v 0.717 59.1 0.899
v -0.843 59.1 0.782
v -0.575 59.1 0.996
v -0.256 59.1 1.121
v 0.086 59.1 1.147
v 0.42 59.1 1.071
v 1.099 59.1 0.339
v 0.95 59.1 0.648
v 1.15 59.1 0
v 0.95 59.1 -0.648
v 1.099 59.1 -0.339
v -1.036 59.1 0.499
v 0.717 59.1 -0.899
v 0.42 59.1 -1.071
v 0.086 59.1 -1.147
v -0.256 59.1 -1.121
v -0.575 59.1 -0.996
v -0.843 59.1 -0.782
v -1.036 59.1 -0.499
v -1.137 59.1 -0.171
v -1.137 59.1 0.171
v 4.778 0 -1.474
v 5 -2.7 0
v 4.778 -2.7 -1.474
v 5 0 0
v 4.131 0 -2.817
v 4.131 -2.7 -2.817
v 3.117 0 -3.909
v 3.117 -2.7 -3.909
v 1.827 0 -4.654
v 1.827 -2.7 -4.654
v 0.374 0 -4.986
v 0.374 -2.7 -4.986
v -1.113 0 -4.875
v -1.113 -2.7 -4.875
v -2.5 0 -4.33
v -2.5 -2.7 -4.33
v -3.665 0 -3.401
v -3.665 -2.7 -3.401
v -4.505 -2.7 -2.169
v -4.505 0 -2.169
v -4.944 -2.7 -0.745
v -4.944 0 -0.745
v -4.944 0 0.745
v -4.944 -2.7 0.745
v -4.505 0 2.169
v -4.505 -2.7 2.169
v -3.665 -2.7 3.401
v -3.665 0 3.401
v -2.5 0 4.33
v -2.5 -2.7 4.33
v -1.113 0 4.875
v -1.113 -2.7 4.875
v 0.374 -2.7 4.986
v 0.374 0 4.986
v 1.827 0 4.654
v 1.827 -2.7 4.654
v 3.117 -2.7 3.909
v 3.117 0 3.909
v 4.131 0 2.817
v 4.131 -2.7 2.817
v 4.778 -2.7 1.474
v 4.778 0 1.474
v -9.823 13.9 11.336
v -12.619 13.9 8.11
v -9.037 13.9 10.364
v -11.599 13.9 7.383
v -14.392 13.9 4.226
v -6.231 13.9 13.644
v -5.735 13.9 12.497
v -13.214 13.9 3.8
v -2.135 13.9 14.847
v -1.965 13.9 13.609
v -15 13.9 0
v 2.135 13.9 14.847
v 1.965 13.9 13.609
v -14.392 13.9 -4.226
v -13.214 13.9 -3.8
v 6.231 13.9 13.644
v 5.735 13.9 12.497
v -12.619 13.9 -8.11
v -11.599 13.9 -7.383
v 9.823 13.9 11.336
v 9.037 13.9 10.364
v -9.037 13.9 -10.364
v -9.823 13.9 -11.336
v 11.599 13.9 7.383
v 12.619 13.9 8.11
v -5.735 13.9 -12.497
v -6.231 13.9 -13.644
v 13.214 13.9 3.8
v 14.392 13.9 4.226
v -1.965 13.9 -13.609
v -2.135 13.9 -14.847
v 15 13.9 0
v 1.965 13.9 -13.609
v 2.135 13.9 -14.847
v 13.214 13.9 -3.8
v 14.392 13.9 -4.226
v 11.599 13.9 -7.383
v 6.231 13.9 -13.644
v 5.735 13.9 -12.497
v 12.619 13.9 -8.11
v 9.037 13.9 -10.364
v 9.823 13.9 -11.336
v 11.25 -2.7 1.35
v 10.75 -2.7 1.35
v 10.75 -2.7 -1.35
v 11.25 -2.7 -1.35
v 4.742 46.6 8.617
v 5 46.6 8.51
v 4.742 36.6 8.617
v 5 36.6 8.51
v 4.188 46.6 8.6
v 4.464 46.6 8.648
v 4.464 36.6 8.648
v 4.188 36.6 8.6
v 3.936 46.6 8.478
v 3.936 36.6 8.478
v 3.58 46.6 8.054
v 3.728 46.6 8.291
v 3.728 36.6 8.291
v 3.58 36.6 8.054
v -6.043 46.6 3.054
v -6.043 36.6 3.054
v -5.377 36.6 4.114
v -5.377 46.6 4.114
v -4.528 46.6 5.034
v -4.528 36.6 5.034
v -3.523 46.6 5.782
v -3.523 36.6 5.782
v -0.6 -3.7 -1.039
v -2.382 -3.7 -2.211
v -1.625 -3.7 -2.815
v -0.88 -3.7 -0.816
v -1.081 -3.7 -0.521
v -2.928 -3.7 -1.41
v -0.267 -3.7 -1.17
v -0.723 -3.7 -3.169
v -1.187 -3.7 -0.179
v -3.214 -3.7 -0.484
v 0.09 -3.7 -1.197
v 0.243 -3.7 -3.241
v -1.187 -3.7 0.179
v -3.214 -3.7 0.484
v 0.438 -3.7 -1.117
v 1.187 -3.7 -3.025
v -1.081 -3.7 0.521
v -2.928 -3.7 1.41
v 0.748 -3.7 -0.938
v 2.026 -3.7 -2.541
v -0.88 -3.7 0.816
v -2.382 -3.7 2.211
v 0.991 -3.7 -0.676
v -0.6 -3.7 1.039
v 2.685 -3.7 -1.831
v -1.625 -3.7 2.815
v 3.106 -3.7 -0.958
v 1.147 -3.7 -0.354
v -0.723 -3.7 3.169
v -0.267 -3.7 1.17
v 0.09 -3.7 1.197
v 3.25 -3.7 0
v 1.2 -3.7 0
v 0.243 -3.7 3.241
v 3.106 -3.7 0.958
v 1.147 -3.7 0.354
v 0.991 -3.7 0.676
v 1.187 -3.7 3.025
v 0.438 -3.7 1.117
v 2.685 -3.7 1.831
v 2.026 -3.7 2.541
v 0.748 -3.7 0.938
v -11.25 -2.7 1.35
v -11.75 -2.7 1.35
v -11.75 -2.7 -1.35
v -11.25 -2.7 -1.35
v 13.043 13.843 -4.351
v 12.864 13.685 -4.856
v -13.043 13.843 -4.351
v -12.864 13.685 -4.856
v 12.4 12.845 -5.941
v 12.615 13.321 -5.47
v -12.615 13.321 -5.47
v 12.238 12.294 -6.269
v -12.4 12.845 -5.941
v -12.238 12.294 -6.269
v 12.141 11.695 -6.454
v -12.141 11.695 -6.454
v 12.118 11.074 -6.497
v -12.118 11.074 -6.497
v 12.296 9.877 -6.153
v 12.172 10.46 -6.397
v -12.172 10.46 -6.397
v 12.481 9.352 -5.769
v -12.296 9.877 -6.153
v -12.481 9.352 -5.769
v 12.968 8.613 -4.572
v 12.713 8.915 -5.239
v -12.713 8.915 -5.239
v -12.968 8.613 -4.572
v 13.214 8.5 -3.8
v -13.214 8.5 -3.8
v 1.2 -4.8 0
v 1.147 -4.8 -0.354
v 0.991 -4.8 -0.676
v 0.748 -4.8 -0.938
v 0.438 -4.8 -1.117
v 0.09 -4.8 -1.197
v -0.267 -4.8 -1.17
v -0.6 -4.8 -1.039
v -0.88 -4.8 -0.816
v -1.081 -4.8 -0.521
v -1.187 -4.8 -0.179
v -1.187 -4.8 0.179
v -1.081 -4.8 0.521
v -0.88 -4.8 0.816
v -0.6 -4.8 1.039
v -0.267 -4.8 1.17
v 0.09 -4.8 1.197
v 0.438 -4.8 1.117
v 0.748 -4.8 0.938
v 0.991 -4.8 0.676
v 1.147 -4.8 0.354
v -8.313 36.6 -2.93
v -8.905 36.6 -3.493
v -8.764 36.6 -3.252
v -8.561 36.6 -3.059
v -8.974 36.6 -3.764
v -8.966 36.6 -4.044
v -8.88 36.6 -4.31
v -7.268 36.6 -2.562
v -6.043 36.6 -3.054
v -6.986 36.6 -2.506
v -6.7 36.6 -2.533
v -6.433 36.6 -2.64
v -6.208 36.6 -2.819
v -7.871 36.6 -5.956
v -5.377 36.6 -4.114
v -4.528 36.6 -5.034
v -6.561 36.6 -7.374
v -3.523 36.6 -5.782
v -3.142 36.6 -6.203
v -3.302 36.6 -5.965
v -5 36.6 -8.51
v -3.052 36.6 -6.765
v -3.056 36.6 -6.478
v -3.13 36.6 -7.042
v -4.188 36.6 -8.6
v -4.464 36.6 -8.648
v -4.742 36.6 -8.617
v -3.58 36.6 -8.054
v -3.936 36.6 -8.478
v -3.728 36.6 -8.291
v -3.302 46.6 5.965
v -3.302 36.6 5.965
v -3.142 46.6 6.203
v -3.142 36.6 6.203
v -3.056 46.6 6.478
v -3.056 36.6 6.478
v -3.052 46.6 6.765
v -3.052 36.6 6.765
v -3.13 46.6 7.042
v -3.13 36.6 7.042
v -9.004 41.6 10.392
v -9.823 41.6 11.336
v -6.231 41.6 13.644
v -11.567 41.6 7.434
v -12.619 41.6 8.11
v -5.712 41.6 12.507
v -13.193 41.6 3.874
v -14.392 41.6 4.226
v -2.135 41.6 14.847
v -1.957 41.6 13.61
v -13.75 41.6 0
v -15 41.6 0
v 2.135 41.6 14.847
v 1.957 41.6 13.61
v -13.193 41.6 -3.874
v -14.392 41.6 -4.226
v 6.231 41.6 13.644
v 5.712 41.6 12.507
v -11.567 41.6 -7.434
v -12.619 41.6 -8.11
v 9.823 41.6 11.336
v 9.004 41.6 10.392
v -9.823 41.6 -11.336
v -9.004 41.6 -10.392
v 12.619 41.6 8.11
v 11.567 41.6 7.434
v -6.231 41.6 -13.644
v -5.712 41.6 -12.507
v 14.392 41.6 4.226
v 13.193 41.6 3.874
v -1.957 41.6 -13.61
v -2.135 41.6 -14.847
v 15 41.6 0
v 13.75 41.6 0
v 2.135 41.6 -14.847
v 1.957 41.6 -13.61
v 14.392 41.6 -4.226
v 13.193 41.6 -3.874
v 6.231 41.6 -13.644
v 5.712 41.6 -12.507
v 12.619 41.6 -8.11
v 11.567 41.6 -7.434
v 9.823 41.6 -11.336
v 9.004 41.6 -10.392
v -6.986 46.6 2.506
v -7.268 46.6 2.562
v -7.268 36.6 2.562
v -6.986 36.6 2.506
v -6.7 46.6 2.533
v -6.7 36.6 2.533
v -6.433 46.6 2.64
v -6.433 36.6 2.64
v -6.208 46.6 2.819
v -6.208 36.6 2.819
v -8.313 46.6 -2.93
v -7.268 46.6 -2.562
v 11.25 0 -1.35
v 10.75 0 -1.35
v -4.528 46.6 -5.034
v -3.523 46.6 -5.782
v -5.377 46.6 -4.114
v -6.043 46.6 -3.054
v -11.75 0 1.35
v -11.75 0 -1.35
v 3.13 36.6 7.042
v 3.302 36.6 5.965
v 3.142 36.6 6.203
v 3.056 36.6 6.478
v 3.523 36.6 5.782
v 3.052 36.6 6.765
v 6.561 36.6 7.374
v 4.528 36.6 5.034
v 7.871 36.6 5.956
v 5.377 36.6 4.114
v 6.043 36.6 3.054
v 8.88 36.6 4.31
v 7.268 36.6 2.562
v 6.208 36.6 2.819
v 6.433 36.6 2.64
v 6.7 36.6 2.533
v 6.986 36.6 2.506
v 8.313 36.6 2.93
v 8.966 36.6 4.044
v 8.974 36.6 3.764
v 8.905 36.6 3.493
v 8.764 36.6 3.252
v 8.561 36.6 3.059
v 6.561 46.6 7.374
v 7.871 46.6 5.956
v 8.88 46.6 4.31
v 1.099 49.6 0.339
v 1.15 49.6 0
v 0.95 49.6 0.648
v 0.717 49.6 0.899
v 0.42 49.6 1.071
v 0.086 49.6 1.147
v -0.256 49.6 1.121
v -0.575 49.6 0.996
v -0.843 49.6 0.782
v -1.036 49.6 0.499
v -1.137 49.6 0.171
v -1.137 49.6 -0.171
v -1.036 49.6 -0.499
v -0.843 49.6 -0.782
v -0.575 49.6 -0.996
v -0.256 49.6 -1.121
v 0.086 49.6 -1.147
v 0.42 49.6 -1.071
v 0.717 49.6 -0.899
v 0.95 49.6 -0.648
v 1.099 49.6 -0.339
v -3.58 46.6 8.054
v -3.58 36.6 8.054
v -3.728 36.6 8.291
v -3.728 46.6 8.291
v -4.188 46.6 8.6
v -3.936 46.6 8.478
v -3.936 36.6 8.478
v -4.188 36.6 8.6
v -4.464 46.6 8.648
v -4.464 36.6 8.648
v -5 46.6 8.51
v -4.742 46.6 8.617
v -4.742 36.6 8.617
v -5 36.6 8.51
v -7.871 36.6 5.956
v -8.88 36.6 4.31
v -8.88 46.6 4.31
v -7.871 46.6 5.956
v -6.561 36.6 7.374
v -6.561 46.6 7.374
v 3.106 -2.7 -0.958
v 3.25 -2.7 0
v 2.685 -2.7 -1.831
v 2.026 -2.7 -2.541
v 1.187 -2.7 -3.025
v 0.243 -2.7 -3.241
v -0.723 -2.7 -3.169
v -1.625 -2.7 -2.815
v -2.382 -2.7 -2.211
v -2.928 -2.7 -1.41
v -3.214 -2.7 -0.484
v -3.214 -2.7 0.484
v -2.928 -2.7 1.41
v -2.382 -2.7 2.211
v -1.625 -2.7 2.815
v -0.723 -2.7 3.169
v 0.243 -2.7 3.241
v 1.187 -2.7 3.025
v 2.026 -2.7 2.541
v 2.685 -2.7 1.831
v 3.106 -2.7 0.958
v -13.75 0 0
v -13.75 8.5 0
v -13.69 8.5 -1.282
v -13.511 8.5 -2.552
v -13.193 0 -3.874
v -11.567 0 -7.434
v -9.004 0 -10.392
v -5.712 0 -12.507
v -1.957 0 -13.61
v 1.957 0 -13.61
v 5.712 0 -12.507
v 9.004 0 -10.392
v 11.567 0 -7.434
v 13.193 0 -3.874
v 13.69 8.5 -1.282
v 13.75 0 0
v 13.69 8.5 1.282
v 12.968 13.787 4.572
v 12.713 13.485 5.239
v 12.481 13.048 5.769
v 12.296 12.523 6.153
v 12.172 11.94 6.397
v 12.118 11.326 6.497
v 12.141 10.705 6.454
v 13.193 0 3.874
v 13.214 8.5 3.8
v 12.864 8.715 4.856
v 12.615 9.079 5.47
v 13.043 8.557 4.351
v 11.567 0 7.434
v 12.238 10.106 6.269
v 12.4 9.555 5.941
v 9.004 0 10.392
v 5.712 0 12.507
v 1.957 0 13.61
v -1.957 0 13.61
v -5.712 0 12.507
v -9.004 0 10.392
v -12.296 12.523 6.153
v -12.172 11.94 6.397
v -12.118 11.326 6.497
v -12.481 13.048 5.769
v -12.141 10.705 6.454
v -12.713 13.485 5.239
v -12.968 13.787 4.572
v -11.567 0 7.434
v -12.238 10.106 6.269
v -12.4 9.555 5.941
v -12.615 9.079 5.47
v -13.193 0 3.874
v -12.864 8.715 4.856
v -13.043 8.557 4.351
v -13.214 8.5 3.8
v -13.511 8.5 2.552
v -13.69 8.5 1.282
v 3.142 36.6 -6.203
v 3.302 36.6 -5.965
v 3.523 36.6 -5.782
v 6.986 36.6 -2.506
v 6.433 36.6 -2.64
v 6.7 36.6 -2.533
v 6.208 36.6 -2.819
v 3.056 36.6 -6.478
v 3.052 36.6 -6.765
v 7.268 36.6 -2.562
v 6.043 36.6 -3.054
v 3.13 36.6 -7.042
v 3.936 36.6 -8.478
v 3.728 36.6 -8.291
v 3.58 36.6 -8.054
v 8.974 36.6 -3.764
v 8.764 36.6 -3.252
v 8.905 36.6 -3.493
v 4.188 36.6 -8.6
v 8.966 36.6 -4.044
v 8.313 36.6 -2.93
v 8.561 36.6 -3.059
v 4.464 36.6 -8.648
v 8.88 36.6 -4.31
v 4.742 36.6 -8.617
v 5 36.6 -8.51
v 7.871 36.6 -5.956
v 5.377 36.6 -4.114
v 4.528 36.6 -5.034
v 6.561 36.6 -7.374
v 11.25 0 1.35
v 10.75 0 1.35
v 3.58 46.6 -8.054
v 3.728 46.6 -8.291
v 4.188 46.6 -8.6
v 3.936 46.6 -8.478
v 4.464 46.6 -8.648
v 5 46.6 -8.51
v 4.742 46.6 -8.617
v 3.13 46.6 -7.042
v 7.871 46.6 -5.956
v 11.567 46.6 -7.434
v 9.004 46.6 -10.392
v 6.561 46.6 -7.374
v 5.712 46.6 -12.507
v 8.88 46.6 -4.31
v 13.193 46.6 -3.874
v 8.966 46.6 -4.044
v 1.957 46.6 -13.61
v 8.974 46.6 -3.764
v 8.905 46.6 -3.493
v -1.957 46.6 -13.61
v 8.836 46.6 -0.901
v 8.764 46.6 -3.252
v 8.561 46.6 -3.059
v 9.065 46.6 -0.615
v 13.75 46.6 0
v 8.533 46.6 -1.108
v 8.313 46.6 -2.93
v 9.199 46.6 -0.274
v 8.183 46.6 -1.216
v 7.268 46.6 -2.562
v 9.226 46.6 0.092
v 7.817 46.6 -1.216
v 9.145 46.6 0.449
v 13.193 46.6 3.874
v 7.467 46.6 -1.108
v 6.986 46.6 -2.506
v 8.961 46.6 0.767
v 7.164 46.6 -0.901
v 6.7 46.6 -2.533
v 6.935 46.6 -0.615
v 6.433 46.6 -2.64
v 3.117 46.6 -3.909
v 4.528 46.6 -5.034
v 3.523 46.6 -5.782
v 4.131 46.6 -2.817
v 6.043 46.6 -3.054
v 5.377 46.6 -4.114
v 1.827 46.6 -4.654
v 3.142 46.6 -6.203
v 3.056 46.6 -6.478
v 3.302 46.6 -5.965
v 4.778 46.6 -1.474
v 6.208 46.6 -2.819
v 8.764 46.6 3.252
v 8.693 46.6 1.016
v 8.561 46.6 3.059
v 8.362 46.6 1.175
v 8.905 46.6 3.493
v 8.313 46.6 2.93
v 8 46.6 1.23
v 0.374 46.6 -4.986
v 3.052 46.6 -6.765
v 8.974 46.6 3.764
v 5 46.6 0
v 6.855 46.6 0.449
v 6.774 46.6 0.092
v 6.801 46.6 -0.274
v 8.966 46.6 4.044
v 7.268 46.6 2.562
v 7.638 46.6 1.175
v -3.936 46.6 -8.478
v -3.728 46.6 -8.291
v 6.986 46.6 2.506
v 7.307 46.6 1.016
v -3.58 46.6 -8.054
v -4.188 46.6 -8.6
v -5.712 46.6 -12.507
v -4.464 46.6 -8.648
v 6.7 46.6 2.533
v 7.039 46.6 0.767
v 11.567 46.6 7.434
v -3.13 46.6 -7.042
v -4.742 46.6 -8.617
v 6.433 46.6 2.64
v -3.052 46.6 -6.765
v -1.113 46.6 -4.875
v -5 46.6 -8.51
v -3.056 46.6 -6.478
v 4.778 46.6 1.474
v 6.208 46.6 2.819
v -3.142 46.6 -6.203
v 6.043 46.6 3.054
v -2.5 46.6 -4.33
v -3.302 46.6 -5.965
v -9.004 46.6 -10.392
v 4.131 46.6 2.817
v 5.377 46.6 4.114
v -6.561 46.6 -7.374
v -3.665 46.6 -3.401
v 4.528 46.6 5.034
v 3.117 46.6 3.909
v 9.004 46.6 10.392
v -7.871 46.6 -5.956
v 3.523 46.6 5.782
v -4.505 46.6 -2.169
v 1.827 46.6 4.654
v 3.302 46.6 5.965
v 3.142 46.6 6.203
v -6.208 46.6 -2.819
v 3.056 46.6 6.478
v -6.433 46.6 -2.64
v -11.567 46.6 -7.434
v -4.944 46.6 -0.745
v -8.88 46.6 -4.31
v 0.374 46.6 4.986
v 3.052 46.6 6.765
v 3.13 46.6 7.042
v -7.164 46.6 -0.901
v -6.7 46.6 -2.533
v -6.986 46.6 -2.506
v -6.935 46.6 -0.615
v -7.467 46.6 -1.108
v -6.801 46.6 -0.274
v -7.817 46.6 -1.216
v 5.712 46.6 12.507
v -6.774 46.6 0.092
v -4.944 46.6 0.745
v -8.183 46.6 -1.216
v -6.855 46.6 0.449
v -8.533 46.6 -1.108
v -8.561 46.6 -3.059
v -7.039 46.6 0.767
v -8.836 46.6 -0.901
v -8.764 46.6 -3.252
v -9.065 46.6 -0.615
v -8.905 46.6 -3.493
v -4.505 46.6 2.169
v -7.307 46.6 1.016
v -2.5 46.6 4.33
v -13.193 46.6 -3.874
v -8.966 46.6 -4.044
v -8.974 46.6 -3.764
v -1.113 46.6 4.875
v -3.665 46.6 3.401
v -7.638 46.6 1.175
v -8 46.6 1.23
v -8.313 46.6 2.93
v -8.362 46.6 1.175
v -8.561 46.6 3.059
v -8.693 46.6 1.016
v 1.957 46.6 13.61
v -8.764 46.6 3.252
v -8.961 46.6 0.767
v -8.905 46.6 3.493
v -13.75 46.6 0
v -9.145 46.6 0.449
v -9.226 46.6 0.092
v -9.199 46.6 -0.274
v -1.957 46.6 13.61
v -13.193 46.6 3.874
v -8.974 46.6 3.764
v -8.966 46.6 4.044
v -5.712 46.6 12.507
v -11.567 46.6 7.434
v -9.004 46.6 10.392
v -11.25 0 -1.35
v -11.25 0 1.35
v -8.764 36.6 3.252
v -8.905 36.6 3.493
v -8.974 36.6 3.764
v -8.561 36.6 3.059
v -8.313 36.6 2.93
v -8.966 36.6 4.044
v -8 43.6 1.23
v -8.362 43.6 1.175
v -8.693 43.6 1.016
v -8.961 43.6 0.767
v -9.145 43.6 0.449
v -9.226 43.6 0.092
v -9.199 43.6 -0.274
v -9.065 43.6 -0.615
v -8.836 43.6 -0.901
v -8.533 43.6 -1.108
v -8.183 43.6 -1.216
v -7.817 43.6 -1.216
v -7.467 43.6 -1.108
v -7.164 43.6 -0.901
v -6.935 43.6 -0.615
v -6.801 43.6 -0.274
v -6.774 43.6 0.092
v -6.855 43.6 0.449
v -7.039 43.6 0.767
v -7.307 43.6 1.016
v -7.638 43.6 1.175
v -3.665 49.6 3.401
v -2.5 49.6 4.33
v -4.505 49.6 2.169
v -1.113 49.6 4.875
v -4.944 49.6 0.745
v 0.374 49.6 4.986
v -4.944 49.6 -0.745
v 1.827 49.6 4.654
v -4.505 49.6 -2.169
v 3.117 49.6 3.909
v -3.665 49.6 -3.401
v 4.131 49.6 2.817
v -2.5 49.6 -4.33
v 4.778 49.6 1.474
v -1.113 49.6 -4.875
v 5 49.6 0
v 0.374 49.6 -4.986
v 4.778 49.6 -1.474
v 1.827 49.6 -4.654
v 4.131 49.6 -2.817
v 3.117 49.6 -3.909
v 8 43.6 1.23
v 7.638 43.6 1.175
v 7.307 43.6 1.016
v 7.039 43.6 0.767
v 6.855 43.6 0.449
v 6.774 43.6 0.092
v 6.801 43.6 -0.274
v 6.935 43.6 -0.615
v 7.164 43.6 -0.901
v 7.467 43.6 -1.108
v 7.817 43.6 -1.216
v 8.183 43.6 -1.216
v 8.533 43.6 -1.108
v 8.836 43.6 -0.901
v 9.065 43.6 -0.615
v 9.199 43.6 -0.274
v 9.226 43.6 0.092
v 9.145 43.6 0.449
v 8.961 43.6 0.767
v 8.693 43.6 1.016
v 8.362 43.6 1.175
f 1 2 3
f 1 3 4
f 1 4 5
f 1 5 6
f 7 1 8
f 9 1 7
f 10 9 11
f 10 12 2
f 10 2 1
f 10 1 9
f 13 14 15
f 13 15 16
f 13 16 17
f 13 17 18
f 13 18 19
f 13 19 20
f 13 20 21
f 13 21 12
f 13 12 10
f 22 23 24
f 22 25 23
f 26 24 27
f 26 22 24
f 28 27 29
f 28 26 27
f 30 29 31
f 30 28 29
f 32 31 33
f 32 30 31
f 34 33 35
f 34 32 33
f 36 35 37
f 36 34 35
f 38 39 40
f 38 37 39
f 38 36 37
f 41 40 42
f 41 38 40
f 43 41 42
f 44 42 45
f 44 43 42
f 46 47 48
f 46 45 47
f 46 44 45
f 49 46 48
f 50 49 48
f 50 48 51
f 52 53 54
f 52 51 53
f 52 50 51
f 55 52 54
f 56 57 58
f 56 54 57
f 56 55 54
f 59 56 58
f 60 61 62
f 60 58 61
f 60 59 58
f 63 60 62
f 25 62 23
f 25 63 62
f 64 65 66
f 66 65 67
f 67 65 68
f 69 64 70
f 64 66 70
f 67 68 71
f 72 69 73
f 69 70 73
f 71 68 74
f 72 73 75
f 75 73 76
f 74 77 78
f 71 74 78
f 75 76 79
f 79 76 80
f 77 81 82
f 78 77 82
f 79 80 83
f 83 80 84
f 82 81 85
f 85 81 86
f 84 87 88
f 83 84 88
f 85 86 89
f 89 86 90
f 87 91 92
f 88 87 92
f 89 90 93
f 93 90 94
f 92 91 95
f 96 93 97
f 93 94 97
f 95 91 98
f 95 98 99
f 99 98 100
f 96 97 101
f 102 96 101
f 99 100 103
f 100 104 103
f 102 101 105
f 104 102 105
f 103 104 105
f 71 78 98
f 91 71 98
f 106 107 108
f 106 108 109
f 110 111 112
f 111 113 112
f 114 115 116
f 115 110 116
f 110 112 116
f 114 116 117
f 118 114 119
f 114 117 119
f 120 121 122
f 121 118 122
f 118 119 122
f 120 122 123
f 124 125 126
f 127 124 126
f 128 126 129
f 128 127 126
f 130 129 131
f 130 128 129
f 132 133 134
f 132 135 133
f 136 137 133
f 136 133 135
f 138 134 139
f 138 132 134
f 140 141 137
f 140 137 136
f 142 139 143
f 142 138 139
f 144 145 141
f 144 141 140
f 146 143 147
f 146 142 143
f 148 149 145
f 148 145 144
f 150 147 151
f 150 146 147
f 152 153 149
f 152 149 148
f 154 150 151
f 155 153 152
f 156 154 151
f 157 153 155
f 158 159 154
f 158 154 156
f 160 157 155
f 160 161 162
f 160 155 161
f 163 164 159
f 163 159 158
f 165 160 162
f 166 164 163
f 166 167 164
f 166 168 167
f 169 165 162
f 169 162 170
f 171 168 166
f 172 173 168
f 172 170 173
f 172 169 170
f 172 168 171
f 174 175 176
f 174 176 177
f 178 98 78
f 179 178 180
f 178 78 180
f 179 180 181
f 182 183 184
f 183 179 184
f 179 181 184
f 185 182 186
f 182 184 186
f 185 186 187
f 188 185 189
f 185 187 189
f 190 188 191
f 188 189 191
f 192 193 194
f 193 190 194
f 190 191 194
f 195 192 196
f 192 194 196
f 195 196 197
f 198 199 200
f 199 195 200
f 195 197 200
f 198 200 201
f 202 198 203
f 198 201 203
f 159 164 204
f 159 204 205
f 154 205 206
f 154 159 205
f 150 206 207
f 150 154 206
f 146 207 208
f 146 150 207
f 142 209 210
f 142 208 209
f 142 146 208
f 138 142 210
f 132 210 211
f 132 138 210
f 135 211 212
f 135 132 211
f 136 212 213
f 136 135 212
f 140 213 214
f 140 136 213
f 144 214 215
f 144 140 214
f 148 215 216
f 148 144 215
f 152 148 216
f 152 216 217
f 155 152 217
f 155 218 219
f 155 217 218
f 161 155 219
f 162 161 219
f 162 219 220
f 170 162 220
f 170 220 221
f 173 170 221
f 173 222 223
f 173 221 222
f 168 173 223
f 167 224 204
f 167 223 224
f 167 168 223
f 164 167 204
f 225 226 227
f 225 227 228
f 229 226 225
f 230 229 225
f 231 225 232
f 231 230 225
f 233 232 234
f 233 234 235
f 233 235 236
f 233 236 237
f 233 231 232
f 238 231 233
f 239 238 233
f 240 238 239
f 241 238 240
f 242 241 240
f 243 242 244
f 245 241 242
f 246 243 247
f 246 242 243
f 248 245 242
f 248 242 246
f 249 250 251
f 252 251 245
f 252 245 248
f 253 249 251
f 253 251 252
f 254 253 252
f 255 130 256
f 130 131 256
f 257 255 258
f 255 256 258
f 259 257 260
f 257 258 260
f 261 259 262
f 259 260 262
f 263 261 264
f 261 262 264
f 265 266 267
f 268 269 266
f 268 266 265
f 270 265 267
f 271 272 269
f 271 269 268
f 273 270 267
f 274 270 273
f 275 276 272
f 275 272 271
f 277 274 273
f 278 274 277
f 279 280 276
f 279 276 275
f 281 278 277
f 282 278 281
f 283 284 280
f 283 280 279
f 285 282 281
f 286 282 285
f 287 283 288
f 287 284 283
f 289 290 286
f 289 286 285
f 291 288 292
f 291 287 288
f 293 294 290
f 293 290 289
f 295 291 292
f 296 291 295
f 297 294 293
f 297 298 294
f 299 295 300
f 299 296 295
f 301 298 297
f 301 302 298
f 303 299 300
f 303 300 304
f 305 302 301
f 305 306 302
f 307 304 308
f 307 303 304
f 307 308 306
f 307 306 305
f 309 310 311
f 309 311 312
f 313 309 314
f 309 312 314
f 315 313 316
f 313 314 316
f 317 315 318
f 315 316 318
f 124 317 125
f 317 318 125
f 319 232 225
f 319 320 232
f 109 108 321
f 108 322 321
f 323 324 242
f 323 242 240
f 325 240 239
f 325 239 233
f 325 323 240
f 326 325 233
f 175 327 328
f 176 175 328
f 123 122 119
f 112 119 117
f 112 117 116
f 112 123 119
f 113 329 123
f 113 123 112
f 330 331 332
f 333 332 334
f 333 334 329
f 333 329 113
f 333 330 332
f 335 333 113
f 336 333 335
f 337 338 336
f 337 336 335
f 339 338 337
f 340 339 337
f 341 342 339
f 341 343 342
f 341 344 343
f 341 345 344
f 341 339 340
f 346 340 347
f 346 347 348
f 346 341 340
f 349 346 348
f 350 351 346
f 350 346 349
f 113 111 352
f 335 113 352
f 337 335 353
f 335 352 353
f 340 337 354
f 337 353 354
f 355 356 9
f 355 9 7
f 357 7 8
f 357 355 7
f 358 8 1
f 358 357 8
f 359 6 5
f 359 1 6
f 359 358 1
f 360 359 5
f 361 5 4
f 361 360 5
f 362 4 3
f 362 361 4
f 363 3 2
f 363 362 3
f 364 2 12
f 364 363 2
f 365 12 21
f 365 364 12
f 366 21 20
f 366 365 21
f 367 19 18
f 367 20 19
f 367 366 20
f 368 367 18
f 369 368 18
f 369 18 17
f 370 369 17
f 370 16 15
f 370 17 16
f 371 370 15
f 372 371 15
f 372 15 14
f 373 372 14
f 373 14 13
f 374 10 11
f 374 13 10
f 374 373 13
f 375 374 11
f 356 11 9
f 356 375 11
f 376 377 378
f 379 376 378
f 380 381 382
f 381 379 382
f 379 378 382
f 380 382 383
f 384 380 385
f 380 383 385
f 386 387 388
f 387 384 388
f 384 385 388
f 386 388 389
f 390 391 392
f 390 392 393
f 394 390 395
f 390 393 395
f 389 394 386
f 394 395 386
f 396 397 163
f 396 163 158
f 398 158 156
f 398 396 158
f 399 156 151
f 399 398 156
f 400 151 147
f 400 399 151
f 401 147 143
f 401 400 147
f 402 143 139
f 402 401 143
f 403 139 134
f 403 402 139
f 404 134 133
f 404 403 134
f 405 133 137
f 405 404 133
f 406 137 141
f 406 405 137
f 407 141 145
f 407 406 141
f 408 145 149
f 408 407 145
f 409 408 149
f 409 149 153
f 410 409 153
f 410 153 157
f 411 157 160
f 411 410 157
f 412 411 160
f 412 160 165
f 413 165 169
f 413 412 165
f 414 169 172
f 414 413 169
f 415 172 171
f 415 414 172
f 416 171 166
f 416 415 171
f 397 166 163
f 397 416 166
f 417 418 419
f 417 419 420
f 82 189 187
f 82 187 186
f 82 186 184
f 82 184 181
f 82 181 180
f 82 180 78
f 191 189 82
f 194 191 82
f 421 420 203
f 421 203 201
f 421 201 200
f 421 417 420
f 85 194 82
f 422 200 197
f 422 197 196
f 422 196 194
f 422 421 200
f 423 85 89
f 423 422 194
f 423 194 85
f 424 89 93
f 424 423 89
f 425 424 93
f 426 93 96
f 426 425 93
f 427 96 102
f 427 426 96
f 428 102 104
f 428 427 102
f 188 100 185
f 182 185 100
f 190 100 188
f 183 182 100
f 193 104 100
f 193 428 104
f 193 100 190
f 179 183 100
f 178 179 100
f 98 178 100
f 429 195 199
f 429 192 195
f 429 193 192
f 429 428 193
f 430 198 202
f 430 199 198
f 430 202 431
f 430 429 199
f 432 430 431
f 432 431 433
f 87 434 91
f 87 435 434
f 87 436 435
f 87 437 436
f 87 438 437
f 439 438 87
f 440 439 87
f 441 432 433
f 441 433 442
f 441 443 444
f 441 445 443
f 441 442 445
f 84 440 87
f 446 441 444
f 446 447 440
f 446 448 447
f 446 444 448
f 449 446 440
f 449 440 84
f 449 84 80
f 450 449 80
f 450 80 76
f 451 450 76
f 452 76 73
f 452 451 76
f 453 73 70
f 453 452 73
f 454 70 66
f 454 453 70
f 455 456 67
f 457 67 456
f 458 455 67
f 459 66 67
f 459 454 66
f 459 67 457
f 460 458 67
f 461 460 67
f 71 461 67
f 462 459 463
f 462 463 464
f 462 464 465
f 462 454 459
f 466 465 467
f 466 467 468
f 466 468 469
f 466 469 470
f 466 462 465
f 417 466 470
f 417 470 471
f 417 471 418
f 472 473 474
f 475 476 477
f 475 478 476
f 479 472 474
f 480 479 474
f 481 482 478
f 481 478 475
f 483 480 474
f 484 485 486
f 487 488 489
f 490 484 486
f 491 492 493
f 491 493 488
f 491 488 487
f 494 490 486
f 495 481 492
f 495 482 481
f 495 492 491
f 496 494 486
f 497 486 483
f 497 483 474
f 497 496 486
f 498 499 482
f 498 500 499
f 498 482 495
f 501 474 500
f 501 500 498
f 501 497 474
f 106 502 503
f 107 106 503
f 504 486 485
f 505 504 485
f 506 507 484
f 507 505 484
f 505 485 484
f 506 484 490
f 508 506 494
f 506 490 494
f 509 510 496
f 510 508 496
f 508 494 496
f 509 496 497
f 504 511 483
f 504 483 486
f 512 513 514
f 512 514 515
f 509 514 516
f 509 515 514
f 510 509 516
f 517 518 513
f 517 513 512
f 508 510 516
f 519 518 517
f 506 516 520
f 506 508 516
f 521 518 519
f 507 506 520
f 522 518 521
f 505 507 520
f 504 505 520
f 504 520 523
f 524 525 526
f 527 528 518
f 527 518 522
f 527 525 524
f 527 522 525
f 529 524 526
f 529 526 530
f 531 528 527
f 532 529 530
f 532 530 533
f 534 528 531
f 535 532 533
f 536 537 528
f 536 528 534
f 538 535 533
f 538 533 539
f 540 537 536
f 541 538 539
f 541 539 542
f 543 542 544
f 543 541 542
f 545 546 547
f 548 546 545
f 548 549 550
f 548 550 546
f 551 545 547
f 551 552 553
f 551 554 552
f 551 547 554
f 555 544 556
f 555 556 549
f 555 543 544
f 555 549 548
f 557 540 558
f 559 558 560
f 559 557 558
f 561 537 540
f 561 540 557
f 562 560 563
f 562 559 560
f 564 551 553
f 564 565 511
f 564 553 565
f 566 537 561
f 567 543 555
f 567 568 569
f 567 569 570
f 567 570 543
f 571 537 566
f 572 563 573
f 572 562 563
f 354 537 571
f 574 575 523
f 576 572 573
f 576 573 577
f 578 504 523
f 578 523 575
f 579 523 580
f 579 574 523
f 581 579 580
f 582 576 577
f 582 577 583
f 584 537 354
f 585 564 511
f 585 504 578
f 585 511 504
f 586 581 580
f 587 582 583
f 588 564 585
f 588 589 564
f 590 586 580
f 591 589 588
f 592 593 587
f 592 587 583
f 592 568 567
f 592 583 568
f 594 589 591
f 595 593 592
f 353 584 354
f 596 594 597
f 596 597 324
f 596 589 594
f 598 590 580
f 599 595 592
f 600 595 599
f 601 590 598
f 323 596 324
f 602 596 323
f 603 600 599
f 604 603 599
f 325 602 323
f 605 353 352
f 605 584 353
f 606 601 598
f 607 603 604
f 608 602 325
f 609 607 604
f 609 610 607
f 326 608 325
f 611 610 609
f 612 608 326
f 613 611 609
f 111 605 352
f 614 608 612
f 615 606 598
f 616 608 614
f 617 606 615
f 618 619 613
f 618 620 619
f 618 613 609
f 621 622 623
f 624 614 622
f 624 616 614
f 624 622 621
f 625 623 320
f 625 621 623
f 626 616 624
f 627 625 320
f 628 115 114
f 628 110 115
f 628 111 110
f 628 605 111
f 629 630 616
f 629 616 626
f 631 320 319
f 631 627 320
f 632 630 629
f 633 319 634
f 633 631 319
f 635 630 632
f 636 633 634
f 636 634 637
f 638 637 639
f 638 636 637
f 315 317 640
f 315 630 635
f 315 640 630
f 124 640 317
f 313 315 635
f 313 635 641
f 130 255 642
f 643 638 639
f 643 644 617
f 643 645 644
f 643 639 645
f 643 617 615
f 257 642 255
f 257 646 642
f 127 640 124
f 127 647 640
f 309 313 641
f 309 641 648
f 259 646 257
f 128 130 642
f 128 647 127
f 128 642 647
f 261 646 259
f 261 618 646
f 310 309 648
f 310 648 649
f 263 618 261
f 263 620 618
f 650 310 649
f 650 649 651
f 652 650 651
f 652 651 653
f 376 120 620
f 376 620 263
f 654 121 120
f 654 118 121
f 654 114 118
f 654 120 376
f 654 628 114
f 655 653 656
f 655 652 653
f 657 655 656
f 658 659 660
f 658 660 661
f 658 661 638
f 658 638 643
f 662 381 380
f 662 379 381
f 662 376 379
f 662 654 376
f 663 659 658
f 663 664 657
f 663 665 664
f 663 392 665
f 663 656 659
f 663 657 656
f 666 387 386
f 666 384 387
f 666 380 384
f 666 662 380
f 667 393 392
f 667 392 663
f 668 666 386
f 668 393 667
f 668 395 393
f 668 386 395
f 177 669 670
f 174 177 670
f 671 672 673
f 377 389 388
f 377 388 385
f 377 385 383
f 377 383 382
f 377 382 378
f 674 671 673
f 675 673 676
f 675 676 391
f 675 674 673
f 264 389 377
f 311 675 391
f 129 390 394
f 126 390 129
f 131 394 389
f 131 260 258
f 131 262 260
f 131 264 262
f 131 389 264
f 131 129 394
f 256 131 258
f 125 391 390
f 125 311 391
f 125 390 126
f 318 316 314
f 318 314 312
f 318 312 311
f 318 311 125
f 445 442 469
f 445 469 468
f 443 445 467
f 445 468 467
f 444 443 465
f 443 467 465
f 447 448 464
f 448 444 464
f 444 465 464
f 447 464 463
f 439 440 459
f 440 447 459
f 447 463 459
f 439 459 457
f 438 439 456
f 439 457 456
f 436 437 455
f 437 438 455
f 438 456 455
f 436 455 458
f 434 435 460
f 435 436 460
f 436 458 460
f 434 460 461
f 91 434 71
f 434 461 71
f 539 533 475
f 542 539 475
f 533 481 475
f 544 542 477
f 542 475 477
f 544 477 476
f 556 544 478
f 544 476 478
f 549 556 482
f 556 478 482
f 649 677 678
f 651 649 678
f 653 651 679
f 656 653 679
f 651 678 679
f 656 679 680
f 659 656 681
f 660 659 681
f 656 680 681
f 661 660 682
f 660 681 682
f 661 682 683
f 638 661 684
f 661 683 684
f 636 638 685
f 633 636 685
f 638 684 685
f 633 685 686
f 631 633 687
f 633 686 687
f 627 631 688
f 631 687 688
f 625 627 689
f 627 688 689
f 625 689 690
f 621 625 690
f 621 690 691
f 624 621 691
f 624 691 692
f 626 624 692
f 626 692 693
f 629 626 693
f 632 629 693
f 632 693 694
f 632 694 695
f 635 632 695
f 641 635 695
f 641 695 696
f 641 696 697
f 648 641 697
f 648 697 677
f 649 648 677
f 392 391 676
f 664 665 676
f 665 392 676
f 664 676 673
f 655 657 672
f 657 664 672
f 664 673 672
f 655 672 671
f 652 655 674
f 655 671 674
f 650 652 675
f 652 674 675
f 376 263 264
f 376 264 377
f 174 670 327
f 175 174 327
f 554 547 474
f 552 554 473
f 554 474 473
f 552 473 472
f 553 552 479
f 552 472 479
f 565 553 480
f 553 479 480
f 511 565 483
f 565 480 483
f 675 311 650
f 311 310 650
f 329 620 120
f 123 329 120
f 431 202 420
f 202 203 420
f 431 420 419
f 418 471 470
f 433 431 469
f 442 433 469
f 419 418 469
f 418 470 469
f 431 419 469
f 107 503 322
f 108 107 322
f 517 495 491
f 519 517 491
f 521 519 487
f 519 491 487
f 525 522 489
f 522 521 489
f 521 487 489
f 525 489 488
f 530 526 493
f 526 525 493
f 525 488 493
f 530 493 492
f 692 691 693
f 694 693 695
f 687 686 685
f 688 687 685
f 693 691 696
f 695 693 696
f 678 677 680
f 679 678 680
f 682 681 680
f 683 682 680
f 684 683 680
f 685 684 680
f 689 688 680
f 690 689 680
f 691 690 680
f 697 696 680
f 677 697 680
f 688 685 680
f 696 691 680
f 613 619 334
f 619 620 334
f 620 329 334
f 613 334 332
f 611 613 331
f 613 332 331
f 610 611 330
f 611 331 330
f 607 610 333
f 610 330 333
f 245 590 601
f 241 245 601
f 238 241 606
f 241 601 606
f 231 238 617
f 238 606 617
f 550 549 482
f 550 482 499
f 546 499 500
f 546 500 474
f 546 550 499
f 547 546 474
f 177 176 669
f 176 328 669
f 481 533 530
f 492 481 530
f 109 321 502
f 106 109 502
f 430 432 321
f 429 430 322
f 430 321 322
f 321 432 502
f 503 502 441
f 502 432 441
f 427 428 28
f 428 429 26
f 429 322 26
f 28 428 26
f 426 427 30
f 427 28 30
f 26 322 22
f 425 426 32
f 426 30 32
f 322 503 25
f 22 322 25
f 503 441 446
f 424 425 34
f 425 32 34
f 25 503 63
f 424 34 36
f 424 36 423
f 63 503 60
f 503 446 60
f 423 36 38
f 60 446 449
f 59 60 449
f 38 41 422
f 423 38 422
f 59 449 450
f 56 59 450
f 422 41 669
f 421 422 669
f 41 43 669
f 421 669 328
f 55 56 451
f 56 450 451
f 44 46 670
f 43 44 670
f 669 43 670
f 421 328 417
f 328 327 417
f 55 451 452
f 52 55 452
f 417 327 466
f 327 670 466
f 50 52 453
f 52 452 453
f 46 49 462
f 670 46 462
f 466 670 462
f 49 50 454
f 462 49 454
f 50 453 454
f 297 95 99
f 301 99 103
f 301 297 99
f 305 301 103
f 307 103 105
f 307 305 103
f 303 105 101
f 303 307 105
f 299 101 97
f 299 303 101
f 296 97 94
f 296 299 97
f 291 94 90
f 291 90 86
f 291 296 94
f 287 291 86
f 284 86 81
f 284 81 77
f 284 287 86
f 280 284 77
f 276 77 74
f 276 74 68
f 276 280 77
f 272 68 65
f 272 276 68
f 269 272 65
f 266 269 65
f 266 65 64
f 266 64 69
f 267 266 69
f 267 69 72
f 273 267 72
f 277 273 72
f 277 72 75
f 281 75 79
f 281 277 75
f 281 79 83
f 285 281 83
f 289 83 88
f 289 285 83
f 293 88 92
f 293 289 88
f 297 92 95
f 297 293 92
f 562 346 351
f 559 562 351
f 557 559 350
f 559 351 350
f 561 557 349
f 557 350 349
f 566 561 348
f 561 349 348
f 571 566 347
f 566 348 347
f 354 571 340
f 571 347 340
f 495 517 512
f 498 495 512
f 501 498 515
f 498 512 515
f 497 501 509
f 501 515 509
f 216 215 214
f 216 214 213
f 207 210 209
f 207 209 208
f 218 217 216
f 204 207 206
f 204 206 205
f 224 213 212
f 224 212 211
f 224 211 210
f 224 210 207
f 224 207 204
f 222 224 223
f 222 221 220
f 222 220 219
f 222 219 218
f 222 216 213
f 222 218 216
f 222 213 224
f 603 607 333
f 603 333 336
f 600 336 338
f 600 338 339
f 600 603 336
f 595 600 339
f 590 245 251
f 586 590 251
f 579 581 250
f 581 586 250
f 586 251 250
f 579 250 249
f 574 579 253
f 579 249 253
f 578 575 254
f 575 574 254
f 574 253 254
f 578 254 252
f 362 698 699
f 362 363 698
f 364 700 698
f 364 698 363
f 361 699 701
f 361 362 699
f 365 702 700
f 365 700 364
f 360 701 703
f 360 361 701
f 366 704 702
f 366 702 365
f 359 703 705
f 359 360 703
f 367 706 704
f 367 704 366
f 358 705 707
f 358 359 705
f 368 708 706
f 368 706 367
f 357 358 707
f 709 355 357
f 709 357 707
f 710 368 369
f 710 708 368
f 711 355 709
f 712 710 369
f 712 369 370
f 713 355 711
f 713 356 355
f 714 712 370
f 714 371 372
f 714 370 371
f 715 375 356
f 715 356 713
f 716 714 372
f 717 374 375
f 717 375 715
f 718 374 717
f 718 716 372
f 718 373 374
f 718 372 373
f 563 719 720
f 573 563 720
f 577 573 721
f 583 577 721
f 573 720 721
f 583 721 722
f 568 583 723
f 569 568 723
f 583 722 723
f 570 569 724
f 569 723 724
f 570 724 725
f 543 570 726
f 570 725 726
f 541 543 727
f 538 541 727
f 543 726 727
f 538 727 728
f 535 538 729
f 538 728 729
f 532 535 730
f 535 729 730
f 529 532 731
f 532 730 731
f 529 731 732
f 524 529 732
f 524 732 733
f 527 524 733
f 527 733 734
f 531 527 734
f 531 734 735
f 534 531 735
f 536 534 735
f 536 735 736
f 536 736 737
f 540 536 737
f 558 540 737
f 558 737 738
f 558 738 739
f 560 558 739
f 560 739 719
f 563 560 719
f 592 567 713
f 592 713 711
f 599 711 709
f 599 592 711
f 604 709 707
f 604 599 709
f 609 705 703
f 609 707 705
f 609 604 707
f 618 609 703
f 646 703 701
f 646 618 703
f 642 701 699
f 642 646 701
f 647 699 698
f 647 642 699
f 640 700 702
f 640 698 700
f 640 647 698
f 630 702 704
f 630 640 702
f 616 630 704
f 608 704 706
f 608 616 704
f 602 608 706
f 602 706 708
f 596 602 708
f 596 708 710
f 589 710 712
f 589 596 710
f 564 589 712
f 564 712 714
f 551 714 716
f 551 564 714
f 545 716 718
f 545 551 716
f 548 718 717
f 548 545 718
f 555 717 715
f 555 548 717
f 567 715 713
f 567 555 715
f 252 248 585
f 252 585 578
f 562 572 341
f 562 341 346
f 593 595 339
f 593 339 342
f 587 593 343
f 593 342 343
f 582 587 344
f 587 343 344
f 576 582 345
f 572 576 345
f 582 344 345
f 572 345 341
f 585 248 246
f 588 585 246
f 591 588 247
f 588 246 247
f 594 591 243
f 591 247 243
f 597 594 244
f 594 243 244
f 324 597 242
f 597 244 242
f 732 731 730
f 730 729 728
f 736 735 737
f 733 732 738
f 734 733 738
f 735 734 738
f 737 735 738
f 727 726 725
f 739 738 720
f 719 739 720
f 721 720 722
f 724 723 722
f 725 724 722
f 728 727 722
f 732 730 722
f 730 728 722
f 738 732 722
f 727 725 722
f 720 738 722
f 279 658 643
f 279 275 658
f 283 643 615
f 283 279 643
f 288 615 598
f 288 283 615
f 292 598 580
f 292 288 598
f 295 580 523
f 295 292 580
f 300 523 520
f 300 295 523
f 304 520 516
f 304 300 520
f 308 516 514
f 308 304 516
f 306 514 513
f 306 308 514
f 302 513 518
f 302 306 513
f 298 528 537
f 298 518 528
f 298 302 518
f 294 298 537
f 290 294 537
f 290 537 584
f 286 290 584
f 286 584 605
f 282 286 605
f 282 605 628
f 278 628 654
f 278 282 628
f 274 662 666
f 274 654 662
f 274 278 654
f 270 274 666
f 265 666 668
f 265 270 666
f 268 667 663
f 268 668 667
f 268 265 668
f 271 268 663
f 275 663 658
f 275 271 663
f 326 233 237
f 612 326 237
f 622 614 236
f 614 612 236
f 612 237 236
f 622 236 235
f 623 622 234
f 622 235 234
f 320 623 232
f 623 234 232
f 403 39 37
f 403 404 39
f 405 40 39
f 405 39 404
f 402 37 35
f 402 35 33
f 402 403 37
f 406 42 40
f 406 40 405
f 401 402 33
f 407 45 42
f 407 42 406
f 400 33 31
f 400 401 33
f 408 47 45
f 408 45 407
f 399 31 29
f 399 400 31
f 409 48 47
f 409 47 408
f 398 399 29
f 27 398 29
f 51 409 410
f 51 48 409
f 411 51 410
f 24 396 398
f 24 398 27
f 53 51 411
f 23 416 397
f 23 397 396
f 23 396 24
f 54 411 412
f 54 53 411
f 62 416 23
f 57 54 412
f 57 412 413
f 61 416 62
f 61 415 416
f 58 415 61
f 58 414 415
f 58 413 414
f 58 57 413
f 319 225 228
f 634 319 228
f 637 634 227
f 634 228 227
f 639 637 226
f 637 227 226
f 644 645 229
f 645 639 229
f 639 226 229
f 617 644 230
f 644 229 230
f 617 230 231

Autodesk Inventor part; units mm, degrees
ref_plane "YZ Plane" through (0, 0, 0) normal (1, 0, 0) x (0, 1, 0)
sketch "Sketch1" plane through (0, 0, 0) normal (0, 1, 0) x (-1, 0, 0)
  circle A0 centre (0, 0) radius 13.75
  dimension "d0" = 27.5
extrude "Extrusion1" add sketch "Sketch1" along normal blind 46.6
sketch "Sketch2" plane through (0, 46.6, 0) normal (0, 1, 0) x (1, 0, 0)
  circle A0 centre (0, 0) radius 13.75 projected
  circle A1 centre (0, 0) radius 5
  dimension "d3" = 10
extrude "Extrusion2" add sketch "Sketch2" along normal blind 3 contours A1
sketch "Sketch3" plane through (0, 46.6, 0) normal (0, 1, 0) x (1, 0, 0)
  circle A0 centre (0, 0) radius 5 projected
  circle A1 centre (0, 0) radius 5 projected
  circle A2 centre (0, 0) radius 13.75 projected
  circle A3 centre (0, 0) radius 13.75 projected
  line L0 (-13.75, 0) -> (13.75, 0)
  point P0 (-8, 0)
  point P1 (8, 0)
  dimension "d6" = 16
  dimension "d7" = 5.75
  dimension "d8" = 5.75
hole "Hole1" at (-8, 46.6, 0) at (8, 46.6, 0) direction (0, -1, 0) diameter 2.459 depth 3 thread size "M3x0.5" class "6H" standard "ISO Metric profile"
ref_plane "Work Plane1" through (0, 41.6, 0) normal (0, 1, 0) x (1, 0, 0)
sketch "Sketch4" plane through (0, 41.6, 0) normal (0, 1, 0) x (1, 0, 0)
  circle A0 centre (0, 0) radius 15
  dimension "d17" = 30
extrude "Extrusion3" add sketch "Sketch4" against normal blind 27.7
sketch "Sketch5" plane through (0, 0, 0) normal (0, -1, 0) x (1, 0, 0)
  circle A0 centre (0, 0) radius 5
  dimension "d20" = 10
extrude "Extrusion4" add sketch "Sketch5" along normal blind 2.7
sketch "Sketch6" plane through (0, 0, 0) normal (0, -1, 0) x (1, 0, 0)
  circle A0 centre (0, 0) radius 5 projected
  circle A1 centre (0, 0) radius 5 projected
  circle A2 centre (0, 0) radius 13.75 projected
  circle A3 centre (0, 0) radius 13.75 projected
  line L0 (13.75, 0) -> (-13.75, 0)
  line L1 (-11.25, 1.35) -> (-11.75, 1.35)
  line L2 (-11.75, 1.35) -> (-11.75, -1.35)
  line L3 (-11.75, -1.35) -> (-11.25, -1.35)
  line L4 (-11.25, -1.35) -> (-11.25, 1.35)
  line L5 (11.25, 1.35) -> (10.75, 1.35)
  line L6 (10.75, 1.35) -> (10.75, -1.35)
  line L7 (10.75, -1.35) -> (11.25, -1.35)
  line L8 (11.25, -1.35) -> (11.25, 1.35)
  dimension "d23" = 22
  dimension "d24" = 0.5
  dimension "d25" = 0.5
  dimension "d26" = 11.25
  dimension "d27" = 11.25
  dimension "d28" = 2.7
  dimension "d29" = 2.7
  dimension "d30" = 1.35
  dimension "d31" = 1.35
extrude "Extrusion5" add sketch "Sketch6" along normal up to surface (2.7 mm away) contours L6 L5 L8 L0 | L0 L8 L7 L6 | L4 L3 L2 L0 | L0 L2 L1 L4
sketch "Sketch7" plane through (0, 49.6, 0) normal (0, 1, 0) x (1, 0, 0)
  circle A0 centre (0, 0) radius 1.15
  dimension "d34" = 2.3
extrude "Extrusion6" add sketch "Sketch7" along normal blind 9.5
ref_plane "Work Plane2" through (0, 50.6, 0) normal (0, 1, 0) x (1, 0, 0)
sketch "Sketch10" plane through (0, 0, 0) normal (1, 0, 0) x (0, 1, 0)
  line L0 (0, -13.75) -> (0, 13.75) projected
  line L1 (13.9, 13.75) -> (13.9, -13.75) projected
  line L2 (8.5, 3.8) -> (13.9, 3.8)
  line L3 (13.9, 3.8) -> (13.9, -3.8)
  line L4 (13.9, -3.8) -> (8.5, -3.8)
  line L5 (8.5, -3.8) -> (8.5, 3.8)
  circle A0 centre (11.2, 3.8) radius 2.7
  circle A1 centre (11.2, -3.8) radius 2.7
  line L6 (0, 0) -> (13.9, 0)
  line L7 (13.9, 13.75) -> (13.9, -13.75) projected
  line L8 (0, -13.75) -> (13.9, -13.75) projected
  point P0 (11.2, -6.5)
  point P1 (11.2, 6.5)
  dimension "d57" = 8.5
  dimension "d59" = 0
  dimension "d60" = 5.4
  dimension "d61" = 13.9
  dimension "d65" = 3.8
  dimension "d66" = 3.8
  dimension "d80" = 5.4
  dimension "d81" = 5.4
  dimension "d82" = 2.7
  dimension "d83" = 2.7
  dimension "d84" = 13
extrude "Extrusion9" cut sketch "Sketch10" along normal mid plane 31.5 contours L6 L1 A1 L5 | L5 A0 L1 L6 | A1 L4 | L4 A1 | A0 L2 | L2 A0
sketch "Sketch12" plane through (0, 46.6, 0) normal (0, 1, 0) x (1, 0, 0)
  circle A0 centre (0, 0) radius 1.15 projected
  circle A1 centre (0, 0) radius 5 projected
  circle A2 centre (-8, 0) radius 1.2295 projected
  circle A3 centre (8, 0) radius 1.2295 projected
  circle A4 centre (0, 0) radius 5 projected
  circle A5 centre (0, 0) radius 13.75 projected
  circle A6 centre (0, 0) radius 13.75 projected
  line L0 (-13.75, 0) -> (13.75, 0)
  line L1 (0, 13.75) -> (0, -13.75)
  circle A7 centre (0, 0) radius 6.7705
  circle A8 centre (0, 0) radius 9.8705
  line L2 (-2.75, 6.1869) -> (-4.0091, 9.0196)
  line L3 (-6.3854, 2.2508) -> (-9.3091, 3.2814)
  line L4 (2.75, 6.1869) -> (4.0091, 9.0196)
  line L5 (6.3854, 2.2508) -> (9.3091, 3.2814)
  circle A9 centre (-8, 0) radius 1.2295 projected
  circle A10 centre (8, 0) radius 1.2295 projected
  line L6 (-2.75, -6.1869) -> (-4.0091, -9.0196)
  line L7 (-6.3854, -2.2508) -> (-9.3091, -3.2814)
  line L8 (2.75, -6.1869) -> (4.0091, -9.0196)
  line L9 (6.3854, -2.2508) -> (9.3091, -3.2814)
  point P0 (0, 6.7705)
  point P1 (0, 9.8705)
  point P2 (-8, 1.2295)
  point P3 (8, 1.2295)
  dimension "d85" = 3.1
  dimension "d86" = 5.5
  dimension "d87" = 4.0091
  dimension "d88" = 4.0091
  dimension "d89" = 1.5
  dimension "d90" = 1.5
  dimension "d91" = 1.2295
  dimension "d92" = 2.459
  dimension "d93" = 2.459
  dimension "d94" = 1.2295
extrude "Extrusion11" cut sketch "Sketch12" against normal blind 10 contours A7 L4 A8 L5 | L9 A8 L8 A7 | A7 L3 A8 L2 | L6 A8 L7 A7
fillet "Fillet1" radius 1 16 edges at (-4.0091, 41.6, -9.0196) (-2.75, 41.6, -6.1869) (-6.3854, 41.6, -2.2508) (-9.3091, 41.6, -3.2814) (9.3091, 41.6, -3.2814) (6.3854, 41.6, -2.2508) (4.0091, 41.6, -9.0196) (9.3091, 41.6, 3.2814) (6.3854, 41.6, 2.2508) (4.0091, 41.6, 9.0196) (2.75, 41.6, 6.1869) (-4.0091, 41.6, 9.0196) (-9.3091, 41.6, 3.2814) (-6.3854, 41.6, 2.2508) (-2.75, 41.6, 6.1869) (2.75, 41.6, -6.1869)
sketch "Sketch13" plane through (0, -2.7, 0) normal (0, -1, 0) x (1, 0, 0)
  circle A0 centre (0, 0) radius 3.25
  dimension "d98" = 6.5
extrude "Extrusion12" add sketch "Sketch13" along normal blind 1
sketch "Sketch14" plane through (0, -3.7, 0) normal (0, -1, 0) x (1, 0, 0)
  circle A0 centre (0, 0) radius 1.2
  dimension "d101" = 2.4
extrude "Extrusion13" add sketch "Sketch14" along normal blind 1.1
equation "\"d7\" = d8"
equation "\"d26\" = d27"
equation "\"d30\" = d31"
equation "\"d65\" = d66"
equation "\"d82\" = 0.5 * d80"
equation "\"d83\" = 0.5 * d81"
equation "\"d87\" = d88"
equation "\"d91\" = 0.5 * d92"
equation "\"d94\" = 0.5 * d93"
equation "\"d41\" = d42"
properties part number "rs390" material "Steel, Mild"
